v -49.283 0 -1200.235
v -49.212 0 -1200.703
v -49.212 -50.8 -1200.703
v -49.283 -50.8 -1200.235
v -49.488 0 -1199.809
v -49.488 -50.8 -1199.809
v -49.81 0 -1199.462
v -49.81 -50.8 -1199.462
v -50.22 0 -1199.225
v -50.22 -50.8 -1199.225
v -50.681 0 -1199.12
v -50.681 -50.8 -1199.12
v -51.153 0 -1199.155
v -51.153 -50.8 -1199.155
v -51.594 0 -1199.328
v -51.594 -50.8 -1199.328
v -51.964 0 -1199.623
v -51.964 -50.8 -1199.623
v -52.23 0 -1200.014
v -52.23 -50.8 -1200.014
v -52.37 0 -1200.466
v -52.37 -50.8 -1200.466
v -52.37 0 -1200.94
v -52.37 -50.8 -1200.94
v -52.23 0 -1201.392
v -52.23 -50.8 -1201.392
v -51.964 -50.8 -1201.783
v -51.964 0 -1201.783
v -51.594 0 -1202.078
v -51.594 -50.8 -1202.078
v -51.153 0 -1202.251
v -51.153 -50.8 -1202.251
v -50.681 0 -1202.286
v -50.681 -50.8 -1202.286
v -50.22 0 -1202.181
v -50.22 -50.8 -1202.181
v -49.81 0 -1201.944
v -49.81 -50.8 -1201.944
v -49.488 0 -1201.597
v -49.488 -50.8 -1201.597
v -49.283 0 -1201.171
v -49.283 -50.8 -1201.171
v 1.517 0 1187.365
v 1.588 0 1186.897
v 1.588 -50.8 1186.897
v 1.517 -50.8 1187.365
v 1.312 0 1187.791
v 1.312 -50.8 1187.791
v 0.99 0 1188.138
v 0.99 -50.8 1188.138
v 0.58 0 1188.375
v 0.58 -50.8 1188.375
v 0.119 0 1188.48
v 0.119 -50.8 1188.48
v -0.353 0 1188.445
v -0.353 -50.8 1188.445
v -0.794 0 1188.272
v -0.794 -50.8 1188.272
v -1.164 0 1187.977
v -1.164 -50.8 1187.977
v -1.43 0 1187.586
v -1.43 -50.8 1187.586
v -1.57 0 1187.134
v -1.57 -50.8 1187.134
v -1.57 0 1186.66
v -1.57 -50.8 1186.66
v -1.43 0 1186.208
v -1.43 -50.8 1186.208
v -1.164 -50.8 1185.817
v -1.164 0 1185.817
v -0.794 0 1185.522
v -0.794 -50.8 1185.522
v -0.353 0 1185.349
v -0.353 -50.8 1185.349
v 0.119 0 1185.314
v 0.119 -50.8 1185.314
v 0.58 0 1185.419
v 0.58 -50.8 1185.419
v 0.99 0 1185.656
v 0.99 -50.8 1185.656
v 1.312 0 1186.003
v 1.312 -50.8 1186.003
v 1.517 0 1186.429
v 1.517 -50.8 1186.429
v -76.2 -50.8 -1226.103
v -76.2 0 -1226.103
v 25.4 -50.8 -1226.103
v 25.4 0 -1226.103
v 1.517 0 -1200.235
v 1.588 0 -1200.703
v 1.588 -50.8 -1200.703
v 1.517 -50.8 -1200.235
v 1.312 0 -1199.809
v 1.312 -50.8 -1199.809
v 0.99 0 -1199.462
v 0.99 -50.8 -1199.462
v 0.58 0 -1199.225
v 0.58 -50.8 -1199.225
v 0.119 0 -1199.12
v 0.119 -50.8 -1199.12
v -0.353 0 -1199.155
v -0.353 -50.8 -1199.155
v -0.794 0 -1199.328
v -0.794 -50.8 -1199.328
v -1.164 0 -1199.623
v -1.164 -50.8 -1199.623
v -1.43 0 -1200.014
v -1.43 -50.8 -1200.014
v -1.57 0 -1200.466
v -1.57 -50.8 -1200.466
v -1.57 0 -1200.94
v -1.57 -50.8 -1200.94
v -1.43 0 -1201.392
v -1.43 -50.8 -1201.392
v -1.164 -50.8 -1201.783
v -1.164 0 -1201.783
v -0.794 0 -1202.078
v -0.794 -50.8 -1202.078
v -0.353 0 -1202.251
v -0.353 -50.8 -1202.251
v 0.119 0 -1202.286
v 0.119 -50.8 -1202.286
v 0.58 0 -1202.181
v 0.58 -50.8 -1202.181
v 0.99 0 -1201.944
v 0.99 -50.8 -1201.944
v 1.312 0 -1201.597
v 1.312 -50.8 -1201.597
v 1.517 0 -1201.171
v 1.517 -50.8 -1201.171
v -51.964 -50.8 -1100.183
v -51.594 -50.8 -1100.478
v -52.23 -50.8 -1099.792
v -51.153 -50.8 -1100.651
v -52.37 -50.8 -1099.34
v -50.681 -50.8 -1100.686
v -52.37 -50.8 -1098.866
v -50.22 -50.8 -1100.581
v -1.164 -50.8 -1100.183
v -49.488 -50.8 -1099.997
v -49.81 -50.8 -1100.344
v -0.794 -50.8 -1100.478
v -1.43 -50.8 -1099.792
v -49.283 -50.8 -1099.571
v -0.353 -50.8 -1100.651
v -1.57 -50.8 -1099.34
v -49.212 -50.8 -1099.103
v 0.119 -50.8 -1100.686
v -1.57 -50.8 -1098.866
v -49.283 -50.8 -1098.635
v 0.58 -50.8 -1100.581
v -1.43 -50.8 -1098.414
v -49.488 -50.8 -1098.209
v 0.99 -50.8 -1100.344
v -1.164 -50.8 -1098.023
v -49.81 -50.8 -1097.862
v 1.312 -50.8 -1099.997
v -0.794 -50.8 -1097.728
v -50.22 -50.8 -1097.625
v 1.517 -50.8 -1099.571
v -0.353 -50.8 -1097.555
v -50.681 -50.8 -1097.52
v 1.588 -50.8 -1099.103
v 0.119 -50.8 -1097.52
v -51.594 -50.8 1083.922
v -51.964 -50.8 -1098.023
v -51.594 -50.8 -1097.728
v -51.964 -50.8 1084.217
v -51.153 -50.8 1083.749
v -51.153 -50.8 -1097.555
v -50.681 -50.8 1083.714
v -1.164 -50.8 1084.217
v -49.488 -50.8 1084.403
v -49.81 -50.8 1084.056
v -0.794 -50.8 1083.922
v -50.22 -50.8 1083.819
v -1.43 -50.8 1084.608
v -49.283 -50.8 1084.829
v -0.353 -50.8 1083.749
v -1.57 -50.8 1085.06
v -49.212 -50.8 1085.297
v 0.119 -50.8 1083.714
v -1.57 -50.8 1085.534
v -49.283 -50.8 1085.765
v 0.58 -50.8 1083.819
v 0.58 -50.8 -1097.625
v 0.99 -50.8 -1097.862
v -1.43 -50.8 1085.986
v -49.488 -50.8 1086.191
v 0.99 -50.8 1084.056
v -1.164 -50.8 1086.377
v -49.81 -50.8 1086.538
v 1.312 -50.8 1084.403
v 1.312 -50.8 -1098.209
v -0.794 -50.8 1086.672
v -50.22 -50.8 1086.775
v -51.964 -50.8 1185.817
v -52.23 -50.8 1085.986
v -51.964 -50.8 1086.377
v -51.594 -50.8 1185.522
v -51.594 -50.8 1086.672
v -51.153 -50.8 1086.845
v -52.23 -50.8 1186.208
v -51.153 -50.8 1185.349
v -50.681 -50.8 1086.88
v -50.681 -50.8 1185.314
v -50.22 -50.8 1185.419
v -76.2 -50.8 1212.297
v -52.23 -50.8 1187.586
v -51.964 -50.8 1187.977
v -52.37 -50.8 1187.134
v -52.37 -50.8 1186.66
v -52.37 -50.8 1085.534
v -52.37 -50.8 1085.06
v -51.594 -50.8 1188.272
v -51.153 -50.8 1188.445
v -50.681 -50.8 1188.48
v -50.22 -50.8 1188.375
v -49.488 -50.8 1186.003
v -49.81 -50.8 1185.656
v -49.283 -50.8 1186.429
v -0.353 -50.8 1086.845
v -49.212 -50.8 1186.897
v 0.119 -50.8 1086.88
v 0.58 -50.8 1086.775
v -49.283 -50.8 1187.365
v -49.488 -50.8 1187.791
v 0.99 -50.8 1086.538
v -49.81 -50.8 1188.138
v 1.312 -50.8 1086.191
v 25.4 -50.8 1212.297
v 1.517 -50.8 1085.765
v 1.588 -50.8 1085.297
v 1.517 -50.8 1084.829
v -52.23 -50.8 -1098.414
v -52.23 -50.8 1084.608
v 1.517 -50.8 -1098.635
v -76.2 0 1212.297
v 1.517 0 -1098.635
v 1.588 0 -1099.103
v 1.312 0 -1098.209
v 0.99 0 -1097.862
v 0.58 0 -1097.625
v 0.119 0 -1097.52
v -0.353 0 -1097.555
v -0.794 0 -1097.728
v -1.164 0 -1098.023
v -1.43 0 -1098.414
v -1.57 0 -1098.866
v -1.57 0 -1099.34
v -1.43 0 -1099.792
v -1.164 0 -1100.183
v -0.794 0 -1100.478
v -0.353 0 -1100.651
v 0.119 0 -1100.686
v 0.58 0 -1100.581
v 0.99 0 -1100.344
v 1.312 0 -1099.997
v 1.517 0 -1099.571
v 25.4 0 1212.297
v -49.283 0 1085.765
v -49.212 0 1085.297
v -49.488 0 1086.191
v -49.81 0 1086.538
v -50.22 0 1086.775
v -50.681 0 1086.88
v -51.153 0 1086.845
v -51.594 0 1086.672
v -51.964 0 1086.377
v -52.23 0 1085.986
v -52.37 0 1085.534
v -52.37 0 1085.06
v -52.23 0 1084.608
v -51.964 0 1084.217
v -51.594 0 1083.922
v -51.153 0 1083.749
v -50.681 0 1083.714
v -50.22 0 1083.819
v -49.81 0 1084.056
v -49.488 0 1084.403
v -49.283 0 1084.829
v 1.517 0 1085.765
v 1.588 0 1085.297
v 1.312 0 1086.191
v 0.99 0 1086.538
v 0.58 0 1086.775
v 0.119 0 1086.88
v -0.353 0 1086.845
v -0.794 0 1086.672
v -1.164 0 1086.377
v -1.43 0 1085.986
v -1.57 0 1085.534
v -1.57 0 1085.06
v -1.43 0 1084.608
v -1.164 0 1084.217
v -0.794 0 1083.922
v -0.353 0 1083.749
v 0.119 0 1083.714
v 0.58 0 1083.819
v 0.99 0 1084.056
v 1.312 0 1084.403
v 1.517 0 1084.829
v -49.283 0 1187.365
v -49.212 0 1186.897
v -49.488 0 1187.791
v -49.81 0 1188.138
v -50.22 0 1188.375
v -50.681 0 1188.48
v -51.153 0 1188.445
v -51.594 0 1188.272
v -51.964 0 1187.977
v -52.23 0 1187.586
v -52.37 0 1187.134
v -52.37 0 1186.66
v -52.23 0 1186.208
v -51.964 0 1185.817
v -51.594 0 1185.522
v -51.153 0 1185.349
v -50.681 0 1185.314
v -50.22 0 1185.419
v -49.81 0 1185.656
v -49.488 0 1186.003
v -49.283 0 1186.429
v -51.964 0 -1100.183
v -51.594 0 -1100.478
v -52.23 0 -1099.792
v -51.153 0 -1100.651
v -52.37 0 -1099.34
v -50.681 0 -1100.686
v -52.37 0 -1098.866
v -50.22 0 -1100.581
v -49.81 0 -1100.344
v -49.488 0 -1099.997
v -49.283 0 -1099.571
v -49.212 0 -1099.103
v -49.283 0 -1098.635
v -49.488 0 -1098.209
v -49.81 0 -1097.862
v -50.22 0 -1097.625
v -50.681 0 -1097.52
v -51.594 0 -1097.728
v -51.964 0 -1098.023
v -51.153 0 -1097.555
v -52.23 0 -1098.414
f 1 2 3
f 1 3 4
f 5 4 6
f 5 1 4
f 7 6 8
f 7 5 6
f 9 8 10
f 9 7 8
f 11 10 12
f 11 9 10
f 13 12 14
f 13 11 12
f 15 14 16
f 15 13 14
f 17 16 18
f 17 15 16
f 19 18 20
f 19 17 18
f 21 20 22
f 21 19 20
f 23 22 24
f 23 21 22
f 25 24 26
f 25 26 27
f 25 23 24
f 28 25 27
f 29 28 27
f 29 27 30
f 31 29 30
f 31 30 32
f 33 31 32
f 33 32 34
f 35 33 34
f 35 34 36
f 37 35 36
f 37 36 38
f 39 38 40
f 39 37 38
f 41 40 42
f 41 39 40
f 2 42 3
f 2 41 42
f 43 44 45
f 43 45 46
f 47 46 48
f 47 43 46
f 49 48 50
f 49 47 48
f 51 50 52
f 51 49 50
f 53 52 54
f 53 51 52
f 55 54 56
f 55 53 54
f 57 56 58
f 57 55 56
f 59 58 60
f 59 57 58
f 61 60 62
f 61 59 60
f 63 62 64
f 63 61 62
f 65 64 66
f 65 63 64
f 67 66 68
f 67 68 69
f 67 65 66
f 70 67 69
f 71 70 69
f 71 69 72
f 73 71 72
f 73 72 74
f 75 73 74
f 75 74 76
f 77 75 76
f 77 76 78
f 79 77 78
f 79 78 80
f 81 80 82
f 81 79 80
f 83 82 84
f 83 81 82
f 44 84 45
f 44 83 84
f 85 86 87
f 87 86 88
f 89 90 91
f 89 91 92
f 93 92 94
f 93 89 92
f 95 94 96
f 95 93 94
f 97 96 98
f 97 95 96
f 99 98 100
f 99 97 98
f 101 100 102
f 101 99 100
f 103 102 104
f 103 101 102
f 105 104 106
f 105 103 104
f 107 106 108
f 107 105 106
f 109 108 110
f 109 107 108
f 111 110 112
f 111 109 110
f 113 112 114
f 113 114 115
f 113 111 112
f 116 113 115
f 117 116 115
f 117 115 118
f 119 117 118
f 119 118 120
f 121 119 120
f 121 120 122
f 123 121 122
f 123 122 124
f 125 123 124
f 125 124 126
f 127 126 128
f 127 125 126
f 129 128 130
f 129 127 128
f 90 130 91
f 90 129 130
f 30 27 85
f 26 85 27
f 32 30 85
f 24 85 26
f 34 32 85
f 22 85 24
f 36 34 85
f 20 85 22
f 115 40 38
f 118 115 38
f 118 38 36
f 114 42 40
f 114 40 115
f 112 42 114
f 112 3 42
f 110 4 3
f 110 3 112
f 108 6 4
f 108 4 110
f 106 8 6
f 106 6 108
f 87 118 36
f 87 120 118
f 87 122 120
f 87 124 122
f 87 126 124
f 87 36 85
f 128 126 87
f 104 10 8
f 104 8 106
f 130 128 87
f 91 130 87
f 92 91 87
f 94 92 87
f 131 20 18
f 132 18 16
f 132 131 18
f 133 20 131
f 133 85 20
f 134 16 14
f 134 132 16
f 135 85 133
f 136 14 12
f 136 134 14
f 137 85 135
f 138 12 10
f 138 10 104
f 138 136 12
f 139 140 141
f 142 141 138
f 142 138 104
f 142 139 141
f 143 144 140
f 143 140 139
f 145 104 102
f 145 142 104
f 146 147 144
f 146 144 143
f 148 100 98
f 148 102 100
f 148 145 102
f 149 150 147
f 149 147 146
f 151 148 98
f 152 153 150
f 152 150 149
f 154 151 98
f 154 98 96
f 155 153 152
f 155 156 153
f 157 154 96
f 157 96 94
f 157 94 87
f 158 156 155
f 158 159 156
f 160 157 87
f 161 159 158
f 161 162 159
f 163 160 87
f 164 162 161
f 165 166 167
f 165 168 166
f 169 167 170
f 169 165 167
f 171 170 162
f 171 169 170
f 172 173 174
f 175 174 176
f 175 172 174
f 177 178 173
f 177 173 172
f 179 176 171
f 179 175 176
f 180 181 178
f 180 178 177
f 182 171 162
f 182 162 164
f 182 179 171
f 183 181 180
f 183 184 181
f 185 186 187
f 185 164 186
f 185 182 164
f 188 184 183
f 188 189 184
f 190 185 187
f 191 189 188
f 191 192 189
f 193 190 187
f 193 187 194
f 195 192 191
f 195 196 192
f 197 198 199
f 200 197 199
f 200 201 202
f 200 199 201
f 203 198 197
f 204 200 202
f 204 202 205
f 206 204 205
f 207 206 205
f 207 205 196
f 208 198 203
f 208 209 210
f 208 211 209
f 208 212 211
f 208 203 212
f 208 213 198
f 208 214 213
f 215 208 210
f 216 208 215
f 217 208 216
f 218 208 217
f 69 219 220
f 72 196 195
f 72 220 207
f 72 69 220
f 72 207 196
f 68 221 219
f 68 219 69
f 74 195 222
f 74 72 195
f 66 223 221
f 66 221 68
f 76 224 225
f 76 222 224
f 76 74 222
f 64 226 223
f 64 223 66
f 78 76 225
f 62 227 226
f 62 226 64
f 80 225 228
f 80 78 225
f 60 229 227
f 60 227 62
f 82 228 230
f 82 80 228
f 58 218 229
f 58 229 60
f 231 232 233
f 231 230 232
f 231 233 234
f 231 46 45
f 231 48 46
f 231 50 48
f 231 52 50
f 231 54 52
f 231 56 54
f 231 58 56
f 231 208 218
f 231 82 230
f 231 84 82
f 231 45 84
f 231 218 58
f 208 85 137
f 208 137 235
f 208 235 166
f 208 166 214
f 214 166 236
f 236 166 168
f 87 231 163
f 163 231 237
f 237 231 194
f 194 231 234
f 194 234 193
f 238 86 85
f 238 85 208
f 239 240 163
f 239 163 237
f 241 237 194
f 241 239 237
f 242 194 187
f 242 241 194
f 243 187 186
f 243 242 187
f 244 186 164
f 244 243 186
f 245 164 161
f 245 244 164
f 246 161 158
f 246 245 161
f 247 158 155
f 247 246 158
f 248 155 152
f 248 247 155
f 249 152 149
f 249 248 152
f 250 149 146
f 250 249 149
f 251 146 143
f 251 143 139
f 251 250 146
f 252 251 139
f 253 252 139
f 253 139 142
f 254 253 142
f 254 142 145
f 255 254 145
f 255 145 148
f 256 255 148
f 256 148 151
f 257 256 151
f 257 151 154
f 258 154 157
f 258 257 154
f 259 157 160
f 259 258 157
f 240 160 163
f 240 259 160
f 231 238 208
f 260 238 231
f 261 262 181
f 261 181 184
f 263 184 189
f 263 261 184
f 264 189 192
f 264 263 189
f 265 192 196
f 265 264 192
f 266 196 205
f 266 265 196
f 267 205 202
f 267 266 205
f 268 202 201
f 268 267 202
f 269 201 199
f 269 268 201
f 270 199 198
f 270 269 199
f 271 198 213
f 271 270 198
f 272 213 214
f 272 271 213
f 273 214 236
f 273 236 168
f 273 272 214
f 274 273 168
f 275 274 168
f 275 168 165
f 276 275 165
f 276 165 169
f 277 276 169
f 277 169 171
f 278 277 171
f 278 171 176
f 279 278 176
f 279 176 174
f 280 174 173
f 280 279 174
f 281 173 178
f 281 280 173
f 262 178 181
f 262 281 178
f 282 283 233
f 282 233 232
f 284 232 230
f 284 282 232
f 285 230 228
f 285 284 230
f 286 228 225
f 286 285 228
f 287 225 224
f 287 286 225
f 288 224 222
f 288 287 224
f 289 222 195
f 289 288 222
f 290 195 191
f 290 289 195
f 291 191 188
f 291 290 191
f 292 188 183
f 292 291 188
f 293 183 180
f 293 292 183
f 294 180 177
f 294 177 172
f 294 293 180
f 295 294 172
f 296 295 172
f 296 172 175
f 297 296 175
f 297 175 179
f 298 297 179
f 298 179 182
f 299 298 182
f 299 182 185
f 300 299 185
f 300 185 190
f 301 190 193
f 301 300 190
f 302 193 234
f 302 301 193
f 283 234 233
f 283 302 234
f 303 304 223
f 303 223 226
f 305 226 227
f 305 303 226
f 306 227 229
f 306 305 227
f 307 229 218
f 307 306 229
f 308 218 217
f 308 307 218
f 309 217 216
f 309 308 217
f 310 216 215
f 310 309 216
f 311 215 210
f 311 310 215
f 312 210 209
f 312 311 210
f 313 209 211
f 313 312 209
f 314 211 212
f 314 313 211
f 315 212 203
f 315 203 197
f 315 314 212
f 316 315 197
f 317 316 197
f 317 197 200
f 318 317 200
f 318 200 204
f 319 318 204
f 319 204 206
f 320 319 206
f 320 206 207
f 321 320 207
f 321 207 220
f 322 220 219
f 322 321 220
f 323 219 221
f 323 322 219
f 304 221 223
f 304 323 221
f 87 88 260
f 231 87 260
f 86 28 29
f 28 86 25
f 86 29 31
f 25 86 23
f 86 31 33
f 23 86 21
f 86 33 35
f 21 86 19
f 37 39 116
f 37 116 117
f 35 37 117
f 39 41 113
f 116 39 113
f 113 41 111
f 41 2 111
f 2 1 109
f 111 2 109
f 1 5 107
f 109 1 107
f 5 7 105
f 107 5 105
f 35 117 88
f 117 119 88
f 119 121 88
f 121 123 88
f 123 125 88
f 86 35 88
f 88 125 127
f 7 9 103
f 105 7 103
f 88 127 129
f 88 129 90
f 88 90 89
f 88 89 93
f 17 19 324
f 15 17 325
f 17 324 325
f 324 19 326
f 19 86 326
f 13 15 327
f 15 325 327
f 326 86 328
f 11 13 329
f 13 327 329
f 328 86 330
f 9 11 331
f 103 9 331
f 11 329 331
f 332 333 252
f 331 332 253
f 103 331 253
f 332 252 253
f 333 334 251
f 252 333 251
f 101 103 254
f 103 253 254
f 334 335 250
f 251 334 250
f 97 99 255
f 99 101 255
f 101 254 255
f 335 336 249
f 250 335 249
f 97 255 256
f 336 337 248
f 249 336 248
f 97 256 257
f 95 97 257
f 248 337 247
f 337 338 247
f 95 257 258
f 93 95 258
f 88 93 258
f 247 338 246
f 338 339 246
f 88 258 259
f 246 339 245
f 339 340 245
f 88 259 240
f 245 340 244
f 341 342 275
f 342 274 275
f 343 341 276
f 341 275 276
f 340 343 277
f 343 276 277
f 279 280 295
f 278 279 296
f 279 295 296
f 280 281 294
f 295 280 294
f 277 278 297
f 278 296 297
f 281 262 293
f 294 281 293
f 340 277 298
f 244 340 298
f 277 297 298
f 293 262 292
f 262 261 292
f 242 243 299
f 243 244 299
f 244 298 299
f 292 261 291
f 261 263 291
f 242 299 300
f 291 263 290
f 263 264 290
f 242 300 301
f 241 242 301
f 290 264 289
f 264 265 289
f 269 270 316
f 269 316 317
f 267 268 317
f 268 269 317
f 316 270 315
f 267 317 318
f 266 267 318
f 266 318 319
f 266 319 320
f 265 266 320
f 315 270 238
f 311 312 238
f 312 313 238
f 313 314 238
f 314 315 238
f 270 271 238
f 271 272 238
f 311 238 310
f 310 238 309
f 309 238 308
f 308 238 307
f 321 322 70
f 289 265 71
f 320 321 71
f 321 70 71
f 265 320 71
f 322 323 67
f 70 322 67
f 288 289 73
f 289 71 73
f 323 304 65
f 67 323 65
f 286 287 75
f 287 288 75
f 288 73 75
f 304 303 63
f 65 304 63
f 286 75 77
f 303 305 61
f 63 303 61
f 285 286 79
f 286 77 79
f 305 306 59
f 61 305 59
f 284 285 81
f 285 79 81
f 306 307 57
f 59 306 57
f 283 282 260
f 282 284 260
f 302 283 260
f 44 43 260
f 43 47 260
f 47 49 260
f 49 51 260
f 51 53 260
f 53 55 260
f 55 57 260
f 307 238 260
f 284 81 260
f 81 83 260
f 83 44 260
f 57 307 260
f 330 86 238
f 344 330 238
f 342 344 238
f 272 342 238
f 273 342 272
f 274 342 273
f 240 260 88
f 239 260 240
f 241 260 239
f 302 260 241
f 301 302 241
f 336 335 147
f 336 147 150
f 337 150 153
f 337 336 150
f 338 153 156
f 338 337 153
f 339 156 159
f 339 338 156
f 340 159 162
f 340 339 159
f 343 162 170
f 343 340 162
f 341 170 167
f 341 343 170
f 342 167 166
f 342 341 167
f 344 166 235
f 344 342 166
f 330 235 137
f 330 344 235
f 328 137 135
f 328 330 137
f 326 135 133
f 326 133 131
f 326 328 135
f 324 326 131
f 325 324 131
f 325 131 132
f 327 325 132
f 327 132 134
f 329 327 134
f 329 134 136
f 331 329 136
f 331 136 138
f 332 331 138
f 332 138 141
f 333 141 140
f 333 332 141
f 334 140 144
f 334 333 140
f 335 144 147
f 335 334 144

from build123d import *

# Parameters (mm, degrees)
F0_W     = 101.6
F0_H     = 2438.4
F0_R     = 1.5875
F1_DEPTH = 50.8


with BuildPart() as f1:
    # F0 (on Front) → F1 (new body)
    with BuildSketch(Plane.XZ):
        with Locations((-25.4, -6.902985)):
            Rectangle(F0_W, F0_H)
        with Locations((-50.8, -1200.702985)):
            Circle(F0_R, mode=Mode.SUBTRACT)
        with Locations((-50.8, -1099.102985)):
            Circle(F0_R, mode=Mode.SUBTRACT)
        with Locations((0, -1200.702985)):
            Circle(F0_R, mode=Mode.SUBTRACT)
        with Locations((0, -1099.102985)):
            Circle(F0_R, mode=Mode.SUBTRACT)
        with Locations((-50.8, 1085.297015)):
            Circle(F0_R, mode=Mode.SUBTRACT)
        with Locations((-50.8, 1186.897015)):
            Circle(F0_R, mode=Mode.SUBTRACT)
        with Locations((0, 1085.297015)):
            Circle(F0_R, mode=Mode.SUBTRACT)
        with Locations((0, 1186.897015)):
            Circle(F0_R, mode=Mode.SUBTRACT)
    extrude(amount=F1_DEPTH)


solid = f1.part
